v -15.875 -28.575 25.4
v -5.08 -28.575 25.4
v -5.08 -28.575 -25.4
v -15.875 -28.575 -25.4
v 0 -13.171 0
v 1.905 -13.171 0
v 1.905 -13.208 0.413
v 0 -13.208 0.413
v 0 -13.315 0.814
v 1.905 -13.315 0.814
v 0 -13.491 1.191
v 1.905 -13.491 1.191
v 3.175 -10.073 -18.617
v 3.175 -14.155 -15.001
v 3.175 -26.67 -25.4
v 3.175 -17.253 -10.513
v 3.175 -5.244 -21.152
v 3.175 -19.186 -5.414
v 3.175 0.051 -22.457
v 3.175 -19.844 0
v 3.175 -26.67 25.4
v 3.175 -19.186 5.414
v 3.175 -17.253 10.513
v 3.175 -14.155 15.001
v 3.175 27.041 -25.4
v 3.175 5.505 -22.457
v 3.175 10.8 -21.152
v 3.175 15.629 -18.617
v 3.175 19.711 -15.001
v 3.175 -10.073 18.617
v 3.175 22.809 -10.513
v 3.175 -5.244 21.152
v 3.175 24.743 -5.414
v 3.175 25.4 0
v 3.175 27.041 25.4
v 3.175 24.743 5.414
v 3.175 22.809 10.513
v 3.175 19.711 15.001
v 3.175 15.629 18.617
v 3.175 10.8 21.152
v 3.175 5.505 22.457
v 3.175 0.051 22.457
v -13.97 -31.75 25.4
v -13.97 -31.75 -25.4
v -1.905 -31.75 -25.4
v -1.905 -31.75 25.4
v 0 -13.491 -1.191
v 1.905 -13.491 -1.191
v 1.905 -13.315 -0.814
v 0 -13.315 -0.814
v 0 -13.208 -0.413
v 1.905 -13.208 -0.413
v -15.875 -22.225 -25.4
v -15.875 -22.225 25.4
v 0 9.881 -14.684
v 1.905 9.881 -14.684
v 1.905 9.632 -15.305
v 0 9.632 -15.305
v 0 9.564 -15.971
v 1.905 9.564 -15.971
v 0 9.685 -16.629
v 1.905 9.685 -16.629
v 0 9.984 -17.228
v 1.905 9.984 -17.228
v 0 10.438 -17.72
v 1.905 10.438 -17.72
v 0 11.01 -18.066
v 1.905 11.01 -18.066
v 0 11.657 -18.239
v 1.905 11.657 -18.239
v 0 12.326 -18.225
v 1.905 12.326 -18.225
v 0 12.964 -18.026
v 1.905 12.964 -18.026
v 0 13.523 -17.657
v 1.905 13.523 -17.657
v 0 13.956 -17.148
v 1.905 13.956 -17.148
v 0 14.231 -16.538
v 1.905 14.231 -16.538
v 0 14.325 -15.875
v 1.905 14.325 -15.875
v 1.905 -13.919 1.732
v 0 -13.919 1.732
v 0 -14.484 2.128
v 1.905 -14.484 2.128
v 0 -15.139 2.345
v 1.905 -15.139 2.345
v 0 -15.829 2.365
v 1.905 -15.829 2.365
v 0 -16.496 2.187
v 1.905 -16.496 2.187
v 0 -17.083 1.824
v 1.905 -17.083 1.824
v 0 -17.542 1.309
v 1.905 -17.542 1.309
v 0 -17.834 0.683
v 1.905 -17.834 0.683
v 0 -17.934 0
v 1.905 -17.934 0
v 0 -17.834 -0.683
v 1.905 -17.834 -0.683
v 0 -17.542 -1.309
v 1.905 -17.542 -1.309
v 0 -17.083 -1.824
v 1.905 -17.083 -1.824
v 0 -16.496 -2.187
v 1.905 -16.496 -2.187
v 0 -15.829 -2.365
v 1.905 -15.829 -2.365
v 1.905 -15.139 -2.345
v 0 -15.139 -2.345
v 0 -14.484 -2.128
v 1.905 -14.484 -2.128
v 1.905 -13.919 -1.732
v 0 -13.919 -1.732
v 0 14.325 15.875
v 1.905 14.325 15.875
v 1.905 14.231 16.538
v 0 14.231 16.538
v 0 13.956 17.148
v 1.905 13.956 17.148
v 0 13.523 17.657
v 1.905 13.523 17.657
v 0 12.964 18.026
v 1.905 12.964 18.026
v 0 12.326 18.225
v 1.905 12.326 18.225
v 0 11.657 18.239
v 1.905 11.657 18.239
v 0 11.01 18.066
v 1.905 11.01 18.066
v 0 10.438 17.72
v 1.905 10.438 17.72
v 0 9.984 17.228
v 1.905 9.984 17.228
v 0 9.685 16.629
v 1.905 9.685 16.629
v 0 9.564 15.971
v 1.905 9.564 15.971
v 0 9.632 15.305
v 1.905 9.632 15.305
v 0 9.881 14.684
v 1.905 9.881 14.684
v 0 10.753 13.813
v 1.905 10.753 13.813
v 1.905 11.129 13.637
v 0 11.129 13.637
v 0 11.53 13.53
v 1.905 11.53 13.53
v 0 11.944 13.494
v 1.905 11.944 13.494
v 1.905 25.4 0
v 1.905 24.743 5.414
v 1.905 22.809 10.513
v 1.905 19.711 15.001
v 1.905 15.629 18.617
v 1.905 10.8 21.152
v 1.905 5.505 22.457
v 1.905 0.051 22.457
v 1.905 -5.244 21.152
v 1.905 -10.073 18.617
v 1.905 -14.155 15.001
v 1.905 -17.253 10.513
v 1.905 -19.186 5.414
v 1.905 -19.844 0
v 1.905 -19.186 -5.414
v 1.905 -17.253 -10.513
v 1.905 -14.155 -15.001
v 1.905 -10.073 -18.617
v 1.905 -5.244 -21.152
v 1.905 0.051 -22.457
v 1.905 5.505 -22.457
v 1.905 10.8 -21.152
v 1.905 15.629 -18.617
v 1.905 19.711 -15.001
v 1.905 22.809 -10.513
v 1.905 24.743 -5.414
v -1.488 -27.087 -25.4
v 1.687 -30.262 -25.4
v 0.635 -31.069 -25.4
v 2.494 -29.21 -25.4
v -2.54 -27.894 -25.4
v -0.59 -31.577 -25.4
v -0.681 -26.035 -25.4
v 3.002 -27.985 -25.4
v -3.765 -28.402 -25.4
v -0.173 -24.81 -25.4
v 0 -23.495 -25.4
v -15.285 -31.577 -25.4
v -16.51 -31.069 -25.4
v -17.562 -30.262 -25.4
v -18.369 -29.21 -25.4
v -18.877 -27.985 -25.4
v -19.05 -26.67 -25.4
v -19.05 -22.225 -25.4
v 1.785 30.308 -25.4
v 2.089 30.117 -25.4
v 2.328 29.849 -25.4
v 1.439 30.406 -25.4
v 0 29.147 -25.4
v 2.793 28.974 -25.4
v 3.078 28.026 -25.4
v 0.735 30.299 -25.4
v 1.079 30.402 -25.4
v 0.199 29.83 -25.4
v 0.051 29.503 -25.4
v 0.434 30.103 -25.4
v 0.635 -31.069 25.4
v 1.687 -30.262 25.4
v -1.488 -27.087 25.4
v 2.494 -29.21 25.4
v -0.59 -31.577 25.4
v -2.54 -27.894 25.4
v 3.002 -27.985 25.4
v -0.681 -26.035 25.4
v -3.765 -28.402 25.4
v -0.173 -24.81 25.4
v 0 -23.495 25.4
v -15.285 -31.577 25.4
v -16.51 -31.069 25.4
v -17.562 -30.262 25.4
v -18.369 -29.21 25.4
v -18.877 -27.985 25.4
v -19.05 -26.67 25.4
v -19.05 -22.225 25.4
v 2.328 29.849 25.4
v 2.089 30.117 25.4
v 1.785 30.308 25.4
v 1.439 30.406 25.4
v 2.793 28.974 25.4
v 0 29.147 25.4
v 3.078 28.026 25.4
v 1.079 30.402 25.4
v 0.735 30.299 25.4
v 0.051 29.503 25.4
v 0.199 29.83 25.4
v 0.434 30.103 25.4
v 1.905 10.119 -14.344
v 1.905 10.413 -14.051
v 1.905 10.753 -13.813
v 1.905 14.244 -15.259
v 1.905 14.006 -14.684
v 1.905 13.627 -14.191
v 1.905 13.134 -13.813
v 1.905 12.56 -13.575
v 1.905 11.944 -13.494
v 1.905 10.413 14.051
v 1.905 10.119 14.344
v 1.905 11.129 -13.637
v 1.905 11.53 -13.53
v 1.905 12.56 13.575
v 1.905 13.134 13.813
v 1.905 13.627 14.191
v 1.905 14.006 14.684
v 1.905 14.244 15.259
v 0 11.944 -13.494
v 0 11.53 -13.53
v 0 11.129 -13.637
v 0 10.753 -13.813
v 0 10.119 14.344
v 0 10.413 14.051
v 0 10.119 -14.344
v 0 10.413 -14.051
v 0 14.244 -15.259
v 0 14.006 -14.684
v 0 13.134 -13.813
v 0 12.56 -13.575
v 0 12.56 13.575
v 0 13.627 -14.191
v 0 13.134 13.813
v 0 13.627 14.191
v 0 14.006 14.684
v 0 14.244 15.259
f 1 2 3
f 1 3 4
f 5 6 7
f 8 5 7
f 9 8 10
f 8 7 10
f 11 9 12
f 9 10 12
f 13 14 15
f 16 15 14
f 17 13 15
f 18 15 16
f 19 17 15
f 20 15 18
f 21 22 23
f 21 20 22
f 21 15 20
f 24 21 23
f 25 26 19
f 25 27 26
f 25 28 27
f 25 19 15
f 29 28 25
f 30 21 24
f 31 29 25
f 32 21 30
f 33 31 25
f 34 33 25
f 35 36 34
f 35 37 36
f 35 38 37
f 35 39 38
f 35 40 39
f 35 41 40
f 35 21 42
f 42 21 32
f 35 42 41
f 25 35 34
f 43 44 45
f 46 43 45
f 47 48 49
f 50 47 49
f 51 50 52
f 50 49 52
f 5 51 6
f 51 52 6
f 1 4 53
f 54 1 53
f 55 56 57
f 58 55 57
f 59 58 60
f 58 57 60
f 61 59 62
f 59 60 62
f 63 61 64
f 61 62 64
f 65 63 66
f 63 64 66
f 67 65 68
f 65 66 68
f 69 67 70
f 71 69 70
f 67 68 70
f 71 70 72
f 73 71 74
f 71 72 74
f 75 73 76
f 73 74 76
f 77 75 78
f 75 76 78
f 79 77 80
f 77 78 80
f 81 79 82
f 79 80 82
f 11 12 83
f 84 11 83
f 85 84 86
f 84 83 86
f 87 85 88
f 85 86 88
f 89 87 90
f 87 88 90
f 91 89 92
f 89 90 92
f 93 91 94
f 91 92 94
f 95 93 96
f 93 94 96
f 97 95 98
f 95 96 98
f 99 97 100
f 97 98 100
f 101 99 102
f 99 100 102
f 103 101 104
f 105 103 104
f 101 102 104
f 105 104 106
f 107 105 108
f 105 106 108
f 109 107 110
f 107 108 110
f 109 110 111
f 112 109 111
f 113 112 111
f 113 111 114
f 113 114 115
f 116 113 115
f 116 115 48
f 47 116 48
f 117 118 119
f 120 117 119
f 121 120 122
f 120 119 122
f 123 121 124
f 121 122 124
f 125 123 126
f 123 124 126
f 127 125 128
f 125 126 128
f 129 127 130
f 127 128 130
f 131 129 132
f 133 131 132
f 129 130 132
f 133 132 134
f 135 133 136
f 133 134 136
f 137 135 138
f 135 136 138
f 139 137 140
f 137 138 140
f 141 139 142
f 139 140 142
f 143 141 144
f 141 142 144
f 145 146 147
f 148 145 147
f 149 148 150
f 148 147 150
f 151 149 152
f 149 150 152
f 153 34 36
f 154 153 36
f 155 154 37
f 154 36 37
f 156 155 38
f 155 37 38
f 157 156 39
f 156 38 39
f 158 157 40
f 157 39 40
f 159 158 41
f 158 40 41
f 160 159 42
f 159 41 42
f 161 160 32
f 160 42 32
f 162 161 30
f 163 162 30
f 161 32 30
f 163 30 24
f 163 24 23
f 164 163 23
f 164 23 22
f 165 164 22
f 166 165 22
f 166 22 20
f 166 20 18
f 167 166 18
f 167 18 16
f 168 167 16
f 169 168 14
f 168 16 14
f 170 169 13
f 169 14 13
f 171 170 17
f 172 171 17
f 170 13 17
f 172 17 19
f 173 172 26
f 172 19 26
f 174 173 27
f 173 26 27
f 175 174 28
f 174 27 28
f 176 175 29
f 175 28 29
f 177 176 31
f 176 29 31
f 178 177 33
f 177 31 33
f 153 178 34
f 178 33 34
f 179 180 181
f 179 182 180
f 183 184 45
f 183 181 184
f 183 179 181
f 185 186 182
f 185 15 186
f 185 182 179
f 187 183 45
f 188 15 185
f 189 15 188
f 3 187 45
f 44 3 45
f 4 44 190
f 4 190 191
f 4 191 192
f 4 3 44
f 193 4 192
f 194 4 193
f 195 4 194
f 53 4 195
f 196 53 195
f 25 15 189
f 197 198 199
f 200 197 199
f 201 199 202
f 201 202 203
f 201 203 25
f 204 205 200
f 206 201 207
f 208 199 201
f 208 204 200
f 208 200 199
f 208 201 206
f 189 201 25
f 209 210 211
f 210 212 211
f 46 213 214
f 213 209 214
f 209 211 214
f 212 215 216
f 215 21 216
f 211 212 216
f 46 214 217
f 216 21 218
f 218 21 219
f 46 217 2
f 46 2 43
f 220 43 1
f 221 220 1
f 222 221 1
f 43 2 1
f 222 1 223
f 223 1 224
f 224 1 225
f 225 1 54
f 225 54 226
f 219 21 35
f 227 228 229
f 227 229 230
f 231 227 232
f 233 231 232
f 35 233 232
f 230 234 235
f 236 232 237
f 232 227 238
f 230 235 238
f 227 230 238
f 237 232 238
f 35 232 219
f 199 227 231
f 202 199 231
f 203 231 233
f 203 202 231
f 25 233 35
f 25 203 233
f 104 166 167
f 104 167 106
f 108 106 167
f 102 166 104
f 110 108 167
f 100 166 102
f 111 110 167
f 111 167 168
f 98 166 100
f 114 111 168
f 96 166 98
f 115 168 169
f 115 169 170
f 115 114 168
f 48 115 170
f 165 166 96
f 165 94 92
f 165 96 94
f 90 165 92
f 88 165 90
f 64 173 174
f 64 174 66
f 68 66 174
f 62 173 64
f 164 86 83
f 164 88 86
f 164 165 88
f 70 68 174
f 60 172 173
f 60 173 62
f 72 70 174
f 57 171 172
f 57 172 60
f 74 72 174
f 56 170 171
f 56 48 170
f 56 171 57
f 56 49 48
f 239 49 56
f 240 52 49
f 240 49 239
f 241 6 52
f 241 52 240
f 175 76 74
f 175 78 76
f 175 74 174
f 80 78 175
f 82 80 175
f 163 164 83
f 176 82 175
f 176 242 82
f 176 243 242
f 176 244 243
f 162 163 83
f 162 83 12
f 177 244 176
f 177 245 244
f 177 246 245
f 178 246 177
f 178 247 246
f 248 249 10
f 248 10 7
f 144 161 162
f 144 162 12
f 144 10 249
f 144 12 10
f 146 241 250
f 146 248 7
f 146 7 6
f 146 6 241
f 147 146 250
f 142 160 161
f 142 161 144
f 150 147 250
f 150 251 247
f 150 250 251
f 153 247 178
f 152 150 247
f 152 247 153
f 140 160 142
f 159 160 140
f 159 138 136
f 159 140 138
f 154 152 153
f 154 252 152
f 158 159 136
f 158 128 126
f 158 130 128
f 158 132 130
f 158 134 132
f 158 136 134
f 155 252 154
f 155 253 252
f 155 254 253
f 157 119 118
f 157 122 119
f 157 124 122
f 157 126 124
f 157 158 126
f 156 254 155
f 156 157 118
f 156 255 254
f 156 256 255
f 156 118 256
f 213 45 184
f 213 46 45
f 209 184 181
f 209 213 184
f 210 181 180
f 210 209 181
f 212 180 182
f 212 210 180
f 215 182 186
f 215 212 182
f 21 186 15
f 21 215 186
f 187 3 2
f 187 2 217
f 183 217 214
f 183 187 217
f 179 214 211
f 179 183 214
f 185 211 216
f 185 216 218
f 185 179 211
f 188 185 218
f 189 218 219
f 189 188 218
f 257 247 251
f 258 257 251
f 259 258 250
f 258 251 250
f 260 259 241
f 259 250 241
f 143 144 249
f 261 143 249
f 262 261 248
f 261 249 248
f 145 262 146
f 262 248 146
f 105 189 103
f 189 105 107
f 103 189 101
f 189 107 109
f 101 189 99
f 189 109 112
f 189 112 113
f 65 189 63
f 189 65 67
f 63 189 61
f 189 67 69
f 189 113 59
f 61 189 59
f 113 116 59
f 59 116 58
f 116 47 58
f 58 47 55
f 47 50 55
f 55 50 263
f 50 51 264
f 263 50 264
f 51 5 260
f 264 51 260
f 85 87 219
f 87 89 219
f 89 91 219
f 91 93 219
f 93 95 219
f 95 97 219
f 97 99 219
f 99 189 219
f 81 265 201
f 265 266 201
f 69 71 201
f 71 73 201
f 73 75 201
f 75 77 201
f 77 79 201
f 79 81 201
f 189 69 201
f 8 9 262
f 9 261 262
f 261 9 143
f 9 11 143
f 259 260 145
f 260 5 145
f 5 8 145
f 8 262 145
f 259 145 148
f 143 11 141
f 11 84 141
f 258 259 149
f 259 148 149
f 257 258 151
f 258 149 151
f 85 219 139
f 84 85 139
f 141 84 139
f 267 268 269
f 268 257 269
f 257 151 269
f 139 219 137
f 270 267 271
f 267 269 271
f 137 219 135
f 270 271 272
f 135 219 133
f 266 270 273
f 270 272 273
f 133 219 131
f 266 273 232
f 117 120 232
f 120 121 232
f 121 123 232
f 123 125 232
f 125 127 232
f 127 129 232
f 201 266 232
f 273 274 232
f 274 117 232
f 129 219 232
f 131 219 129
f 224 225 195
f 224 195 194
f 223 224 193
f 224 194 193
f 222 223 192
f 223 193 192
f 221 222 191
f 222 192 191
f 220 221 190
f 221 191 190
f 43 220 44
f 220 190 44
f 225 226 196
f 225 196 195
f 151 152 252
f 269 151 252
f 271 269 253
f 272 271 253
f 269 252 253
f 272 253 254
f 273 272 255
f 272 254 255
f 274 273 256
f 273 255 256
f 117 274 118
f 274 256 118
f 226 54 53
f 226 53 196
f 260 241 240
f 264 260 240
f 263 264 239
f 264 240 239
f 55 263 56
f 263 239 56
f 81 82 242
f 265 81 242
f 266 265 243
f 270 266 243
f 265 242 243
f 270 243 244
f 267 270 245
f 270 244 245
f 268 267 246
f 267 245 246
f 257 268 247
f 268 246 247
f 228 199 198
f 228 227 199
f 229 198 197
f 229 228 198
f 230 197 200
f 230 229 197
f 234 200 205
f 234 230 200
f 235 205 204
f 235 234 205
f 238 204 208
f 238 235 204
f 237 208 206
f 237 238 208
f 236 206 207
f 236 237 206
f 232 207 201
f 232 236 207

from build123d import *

# Parameters (mm, degrees)
F0_W        = 63.5
F0_H        = 50.8
F1_DEPTH    = 3.175
F2_R        = 22.621875
F3_DEPTH    = 1.27
F5_DEPTH    = 25.4
F7_DEPTH    = 50.8
F8_T1_DEPTH = 50.8
F8_T3_DEPTH = 74.3464301965
F8_T5_DEPTH = 76.2
F9_R        = 5.08
F10_R       = 1.27


# Not quite as in the source:
# - a fillet or chamfer that OpenCascade refuses, or shapes differently, is made with other operations: its cross-section is extruded or revolved along the edge and cut away or added


with BuildPart() as f1:
    # F0 (on Right) → F1 (new body)
    with BuildSketch(Plane.YZ):
        Rectangle(F0_W, F0_H)
    extrude(amount=F1_DEPTH)

    # F2 (on face) → F3 (cut)
    with BuildSketch(Plane.YZ.offset(3.175)):
        with Locations((2.778125, 0)):
            Circle(F2_R)
    extrude(amount=-F3_DEPTH, mode=Mode.SUBTRACT)

    # F4 (on face) → F5 (cut)
    with BuildSketch(Plane.YZ.offset(1.905)):
        with BuildLine():
            ThreePointArc((14.3248105234, 15.875), (11.3272476722, 18.1751108739), (9.8813375306, 14.684375))
            Line((9.8813375306, 14.684375), (11.9435605234, 15.875))
            Line((11.9435605234, 15.875), (11.9435605234, 13.49375))
            ThreePointArc((11.9435605234, 13.49375), (13.6273585461, 14.1912019773), (14.3248105234, 15.875))
        make_face()
        with BuildLine():
            Line((-15.5527460468, 0), (-13.490523054, 1.190625))
            ThreePointArc((-13.490523054, 1.190625), (-17.9339960468, 0), (-13.490523054, -1.190625))
            Line((-13.490523054, -1.190625), (-15.5527460468, 0))
        make_face()
        with BuildLine():
            ThreePointArc((-13.490523054, -1.190625), (-13.2526351729, -0.6163128512), (-13.1714960468, 0))
            Line((-13.1714960468, 0), (-15.5527460468, 0))
            Line((-15.5527460468, 0), (-13.490523054, -1.190625))
        make_face()
        with BuildLine():
            Line((-15.5527460468, 0), (-13.1714960468, 0))
            ThreePointArc((-13.1714960468, 0), (-13.2526351729, 0.6163128512), (-13.490523054, 1.190625))
            Line((-13.490523054, 1.190625), (-15.5527460468, 0))
        make_face()
        with BuildLine():
            ThreePointArc((10.7529355234, -13.8127770072), (10.2597625007, -14.1912019773), (9.8813375306, -14.684375))
            Line((9.8813375306, -14.684375), (11.9435605234, -15.875))
            Line((11.9435605234, -15.875), (10.7529355234, -13.8127770072))
        make_face()
        with BuildLine():
            Line((11.9435605234, 15.875), (10.7529355234, 13.8127770072))
            ThreePointArc((10.7529355234, 13.8127770072), (11.3272476722, 13.5748891261), (11.9435605234, 13.49375))
            Line((11.9435605234, 13.49375), (11.9435605234, 15.875))
        make_face()
        with BuildLine():
            Line((11.9435605234, 15.875), (9.8813375306, 14.684375))
            ThreePointArc((9.8813375306, 14.684375), (10.2597625007, 14.1912019773), (10.7529355234, 13.8127770072))
            Line((10.7529355234, 13.8127770072), (11.9435605234, 15.875))
        make_face()
        with BuildLine():
            Line((11.9435605234, -15.875), (9.8813375306, -14.684375))
            ThreePointArc((9.8813375306, -14.684375), (11.3272476722, -18.1751108739), (14.3248105234, -15.875))
            ThreePointArc((14.3248105234, -15.875), (13.6273585461, -14.1912019773), (11.9435605234, -13.49375))
            Line((11.9435605234, -13.49375), (11.9435605234, -15.875))
        make_face()
        with BuildLine():
            ThreePointArc((11.9435605234, -13.49375), (11.3272476722, -13.5748891261), (10.7529355234, -13.8127770072))
            Line((10.7529355234, -13.8127770072), (11.9435605234, -15.875))
            Line((11.9435605234, -15.875), (11.9435605234, -13.49375))
        make_face()
    extrude(amount=-F5_DEPTH, mode=Mode.SUBTRACT)

    # F6 (on face) → F7 (join, through all)
    with BuildSketch(Plane.XY.offset(25.4)):
        Polygon((-19.05, -31.75), (0, -31.75), (0, -28.575), (-15.875, -28.575), (-15.875, -22.225), (-19.05, -22.225), align=None)
    extrude(amount=-F7_DEPTH)

    # F8: fillet of radius 5.08 on 3 edges, made by hand

    # F8_s2 → F8_t1 (join)
    with BuildSketch(Plane.XY.offset(-25.4)):
        with BuildLine():
            ThreePointArc((-5.08, -28.575), (-1.4878975516, -27.0871024484), (0, -23.495))
            Line((0, -23.495), (0, -28.575))
            Line((0, -28.575), (-5.08, -28.575))
        make_face()
    extrude(amount=F8_T1_DEPTH)

    # F8_s4 → F8_t3 (cut)
    with BuildSketch(Plane.XY.offset(-37.1732150983)):
        with BuildLine():
            ThreePointArc((0, 31.75), (2.3071134838, 29.8805202921), (3.175, 27.0407139607))
            Line((3.175, 27.0407139607), (3.175, 31.75))
            Line((3.175, 31.75), (0, 31.75))
        make_face()
    extrude(amount=F8_T3_DEPTH, mode=Mode.SUBTRACT)

    # F8_s6 → F8_t5 (cut)
    with BuildSketch(Plane.XY.offset(-38.1)):
        with BuildLine():
            ThreePointArc((-19.05, -26.67), (-17.5621024484, -30.2621024484), (-13.97, -31.75))
            Line((-13.97, -31.75), (-19.05, -31.75))
            Line((-19.05, -31.75), (-19.05, -26.67))
        make_face()
    extrude(amount=F8_T5_DEPTH, mode=Mode.SUBTRACT)

    # F9
    f9_edges = [f1.edges().sort_by_distance(p)[0] for p in [
        (3.175, -31.75, 0),
    ]]
    fillet(f9_edges, radius=F9_R)

    # F10
    f10_edges = [f1.edges().sort_by_distance(p)[0] for p in [
        (0, 31.75, 0),
    ]]
    fillet(f10_edges, radius=F10_R)


solid = f1.part
